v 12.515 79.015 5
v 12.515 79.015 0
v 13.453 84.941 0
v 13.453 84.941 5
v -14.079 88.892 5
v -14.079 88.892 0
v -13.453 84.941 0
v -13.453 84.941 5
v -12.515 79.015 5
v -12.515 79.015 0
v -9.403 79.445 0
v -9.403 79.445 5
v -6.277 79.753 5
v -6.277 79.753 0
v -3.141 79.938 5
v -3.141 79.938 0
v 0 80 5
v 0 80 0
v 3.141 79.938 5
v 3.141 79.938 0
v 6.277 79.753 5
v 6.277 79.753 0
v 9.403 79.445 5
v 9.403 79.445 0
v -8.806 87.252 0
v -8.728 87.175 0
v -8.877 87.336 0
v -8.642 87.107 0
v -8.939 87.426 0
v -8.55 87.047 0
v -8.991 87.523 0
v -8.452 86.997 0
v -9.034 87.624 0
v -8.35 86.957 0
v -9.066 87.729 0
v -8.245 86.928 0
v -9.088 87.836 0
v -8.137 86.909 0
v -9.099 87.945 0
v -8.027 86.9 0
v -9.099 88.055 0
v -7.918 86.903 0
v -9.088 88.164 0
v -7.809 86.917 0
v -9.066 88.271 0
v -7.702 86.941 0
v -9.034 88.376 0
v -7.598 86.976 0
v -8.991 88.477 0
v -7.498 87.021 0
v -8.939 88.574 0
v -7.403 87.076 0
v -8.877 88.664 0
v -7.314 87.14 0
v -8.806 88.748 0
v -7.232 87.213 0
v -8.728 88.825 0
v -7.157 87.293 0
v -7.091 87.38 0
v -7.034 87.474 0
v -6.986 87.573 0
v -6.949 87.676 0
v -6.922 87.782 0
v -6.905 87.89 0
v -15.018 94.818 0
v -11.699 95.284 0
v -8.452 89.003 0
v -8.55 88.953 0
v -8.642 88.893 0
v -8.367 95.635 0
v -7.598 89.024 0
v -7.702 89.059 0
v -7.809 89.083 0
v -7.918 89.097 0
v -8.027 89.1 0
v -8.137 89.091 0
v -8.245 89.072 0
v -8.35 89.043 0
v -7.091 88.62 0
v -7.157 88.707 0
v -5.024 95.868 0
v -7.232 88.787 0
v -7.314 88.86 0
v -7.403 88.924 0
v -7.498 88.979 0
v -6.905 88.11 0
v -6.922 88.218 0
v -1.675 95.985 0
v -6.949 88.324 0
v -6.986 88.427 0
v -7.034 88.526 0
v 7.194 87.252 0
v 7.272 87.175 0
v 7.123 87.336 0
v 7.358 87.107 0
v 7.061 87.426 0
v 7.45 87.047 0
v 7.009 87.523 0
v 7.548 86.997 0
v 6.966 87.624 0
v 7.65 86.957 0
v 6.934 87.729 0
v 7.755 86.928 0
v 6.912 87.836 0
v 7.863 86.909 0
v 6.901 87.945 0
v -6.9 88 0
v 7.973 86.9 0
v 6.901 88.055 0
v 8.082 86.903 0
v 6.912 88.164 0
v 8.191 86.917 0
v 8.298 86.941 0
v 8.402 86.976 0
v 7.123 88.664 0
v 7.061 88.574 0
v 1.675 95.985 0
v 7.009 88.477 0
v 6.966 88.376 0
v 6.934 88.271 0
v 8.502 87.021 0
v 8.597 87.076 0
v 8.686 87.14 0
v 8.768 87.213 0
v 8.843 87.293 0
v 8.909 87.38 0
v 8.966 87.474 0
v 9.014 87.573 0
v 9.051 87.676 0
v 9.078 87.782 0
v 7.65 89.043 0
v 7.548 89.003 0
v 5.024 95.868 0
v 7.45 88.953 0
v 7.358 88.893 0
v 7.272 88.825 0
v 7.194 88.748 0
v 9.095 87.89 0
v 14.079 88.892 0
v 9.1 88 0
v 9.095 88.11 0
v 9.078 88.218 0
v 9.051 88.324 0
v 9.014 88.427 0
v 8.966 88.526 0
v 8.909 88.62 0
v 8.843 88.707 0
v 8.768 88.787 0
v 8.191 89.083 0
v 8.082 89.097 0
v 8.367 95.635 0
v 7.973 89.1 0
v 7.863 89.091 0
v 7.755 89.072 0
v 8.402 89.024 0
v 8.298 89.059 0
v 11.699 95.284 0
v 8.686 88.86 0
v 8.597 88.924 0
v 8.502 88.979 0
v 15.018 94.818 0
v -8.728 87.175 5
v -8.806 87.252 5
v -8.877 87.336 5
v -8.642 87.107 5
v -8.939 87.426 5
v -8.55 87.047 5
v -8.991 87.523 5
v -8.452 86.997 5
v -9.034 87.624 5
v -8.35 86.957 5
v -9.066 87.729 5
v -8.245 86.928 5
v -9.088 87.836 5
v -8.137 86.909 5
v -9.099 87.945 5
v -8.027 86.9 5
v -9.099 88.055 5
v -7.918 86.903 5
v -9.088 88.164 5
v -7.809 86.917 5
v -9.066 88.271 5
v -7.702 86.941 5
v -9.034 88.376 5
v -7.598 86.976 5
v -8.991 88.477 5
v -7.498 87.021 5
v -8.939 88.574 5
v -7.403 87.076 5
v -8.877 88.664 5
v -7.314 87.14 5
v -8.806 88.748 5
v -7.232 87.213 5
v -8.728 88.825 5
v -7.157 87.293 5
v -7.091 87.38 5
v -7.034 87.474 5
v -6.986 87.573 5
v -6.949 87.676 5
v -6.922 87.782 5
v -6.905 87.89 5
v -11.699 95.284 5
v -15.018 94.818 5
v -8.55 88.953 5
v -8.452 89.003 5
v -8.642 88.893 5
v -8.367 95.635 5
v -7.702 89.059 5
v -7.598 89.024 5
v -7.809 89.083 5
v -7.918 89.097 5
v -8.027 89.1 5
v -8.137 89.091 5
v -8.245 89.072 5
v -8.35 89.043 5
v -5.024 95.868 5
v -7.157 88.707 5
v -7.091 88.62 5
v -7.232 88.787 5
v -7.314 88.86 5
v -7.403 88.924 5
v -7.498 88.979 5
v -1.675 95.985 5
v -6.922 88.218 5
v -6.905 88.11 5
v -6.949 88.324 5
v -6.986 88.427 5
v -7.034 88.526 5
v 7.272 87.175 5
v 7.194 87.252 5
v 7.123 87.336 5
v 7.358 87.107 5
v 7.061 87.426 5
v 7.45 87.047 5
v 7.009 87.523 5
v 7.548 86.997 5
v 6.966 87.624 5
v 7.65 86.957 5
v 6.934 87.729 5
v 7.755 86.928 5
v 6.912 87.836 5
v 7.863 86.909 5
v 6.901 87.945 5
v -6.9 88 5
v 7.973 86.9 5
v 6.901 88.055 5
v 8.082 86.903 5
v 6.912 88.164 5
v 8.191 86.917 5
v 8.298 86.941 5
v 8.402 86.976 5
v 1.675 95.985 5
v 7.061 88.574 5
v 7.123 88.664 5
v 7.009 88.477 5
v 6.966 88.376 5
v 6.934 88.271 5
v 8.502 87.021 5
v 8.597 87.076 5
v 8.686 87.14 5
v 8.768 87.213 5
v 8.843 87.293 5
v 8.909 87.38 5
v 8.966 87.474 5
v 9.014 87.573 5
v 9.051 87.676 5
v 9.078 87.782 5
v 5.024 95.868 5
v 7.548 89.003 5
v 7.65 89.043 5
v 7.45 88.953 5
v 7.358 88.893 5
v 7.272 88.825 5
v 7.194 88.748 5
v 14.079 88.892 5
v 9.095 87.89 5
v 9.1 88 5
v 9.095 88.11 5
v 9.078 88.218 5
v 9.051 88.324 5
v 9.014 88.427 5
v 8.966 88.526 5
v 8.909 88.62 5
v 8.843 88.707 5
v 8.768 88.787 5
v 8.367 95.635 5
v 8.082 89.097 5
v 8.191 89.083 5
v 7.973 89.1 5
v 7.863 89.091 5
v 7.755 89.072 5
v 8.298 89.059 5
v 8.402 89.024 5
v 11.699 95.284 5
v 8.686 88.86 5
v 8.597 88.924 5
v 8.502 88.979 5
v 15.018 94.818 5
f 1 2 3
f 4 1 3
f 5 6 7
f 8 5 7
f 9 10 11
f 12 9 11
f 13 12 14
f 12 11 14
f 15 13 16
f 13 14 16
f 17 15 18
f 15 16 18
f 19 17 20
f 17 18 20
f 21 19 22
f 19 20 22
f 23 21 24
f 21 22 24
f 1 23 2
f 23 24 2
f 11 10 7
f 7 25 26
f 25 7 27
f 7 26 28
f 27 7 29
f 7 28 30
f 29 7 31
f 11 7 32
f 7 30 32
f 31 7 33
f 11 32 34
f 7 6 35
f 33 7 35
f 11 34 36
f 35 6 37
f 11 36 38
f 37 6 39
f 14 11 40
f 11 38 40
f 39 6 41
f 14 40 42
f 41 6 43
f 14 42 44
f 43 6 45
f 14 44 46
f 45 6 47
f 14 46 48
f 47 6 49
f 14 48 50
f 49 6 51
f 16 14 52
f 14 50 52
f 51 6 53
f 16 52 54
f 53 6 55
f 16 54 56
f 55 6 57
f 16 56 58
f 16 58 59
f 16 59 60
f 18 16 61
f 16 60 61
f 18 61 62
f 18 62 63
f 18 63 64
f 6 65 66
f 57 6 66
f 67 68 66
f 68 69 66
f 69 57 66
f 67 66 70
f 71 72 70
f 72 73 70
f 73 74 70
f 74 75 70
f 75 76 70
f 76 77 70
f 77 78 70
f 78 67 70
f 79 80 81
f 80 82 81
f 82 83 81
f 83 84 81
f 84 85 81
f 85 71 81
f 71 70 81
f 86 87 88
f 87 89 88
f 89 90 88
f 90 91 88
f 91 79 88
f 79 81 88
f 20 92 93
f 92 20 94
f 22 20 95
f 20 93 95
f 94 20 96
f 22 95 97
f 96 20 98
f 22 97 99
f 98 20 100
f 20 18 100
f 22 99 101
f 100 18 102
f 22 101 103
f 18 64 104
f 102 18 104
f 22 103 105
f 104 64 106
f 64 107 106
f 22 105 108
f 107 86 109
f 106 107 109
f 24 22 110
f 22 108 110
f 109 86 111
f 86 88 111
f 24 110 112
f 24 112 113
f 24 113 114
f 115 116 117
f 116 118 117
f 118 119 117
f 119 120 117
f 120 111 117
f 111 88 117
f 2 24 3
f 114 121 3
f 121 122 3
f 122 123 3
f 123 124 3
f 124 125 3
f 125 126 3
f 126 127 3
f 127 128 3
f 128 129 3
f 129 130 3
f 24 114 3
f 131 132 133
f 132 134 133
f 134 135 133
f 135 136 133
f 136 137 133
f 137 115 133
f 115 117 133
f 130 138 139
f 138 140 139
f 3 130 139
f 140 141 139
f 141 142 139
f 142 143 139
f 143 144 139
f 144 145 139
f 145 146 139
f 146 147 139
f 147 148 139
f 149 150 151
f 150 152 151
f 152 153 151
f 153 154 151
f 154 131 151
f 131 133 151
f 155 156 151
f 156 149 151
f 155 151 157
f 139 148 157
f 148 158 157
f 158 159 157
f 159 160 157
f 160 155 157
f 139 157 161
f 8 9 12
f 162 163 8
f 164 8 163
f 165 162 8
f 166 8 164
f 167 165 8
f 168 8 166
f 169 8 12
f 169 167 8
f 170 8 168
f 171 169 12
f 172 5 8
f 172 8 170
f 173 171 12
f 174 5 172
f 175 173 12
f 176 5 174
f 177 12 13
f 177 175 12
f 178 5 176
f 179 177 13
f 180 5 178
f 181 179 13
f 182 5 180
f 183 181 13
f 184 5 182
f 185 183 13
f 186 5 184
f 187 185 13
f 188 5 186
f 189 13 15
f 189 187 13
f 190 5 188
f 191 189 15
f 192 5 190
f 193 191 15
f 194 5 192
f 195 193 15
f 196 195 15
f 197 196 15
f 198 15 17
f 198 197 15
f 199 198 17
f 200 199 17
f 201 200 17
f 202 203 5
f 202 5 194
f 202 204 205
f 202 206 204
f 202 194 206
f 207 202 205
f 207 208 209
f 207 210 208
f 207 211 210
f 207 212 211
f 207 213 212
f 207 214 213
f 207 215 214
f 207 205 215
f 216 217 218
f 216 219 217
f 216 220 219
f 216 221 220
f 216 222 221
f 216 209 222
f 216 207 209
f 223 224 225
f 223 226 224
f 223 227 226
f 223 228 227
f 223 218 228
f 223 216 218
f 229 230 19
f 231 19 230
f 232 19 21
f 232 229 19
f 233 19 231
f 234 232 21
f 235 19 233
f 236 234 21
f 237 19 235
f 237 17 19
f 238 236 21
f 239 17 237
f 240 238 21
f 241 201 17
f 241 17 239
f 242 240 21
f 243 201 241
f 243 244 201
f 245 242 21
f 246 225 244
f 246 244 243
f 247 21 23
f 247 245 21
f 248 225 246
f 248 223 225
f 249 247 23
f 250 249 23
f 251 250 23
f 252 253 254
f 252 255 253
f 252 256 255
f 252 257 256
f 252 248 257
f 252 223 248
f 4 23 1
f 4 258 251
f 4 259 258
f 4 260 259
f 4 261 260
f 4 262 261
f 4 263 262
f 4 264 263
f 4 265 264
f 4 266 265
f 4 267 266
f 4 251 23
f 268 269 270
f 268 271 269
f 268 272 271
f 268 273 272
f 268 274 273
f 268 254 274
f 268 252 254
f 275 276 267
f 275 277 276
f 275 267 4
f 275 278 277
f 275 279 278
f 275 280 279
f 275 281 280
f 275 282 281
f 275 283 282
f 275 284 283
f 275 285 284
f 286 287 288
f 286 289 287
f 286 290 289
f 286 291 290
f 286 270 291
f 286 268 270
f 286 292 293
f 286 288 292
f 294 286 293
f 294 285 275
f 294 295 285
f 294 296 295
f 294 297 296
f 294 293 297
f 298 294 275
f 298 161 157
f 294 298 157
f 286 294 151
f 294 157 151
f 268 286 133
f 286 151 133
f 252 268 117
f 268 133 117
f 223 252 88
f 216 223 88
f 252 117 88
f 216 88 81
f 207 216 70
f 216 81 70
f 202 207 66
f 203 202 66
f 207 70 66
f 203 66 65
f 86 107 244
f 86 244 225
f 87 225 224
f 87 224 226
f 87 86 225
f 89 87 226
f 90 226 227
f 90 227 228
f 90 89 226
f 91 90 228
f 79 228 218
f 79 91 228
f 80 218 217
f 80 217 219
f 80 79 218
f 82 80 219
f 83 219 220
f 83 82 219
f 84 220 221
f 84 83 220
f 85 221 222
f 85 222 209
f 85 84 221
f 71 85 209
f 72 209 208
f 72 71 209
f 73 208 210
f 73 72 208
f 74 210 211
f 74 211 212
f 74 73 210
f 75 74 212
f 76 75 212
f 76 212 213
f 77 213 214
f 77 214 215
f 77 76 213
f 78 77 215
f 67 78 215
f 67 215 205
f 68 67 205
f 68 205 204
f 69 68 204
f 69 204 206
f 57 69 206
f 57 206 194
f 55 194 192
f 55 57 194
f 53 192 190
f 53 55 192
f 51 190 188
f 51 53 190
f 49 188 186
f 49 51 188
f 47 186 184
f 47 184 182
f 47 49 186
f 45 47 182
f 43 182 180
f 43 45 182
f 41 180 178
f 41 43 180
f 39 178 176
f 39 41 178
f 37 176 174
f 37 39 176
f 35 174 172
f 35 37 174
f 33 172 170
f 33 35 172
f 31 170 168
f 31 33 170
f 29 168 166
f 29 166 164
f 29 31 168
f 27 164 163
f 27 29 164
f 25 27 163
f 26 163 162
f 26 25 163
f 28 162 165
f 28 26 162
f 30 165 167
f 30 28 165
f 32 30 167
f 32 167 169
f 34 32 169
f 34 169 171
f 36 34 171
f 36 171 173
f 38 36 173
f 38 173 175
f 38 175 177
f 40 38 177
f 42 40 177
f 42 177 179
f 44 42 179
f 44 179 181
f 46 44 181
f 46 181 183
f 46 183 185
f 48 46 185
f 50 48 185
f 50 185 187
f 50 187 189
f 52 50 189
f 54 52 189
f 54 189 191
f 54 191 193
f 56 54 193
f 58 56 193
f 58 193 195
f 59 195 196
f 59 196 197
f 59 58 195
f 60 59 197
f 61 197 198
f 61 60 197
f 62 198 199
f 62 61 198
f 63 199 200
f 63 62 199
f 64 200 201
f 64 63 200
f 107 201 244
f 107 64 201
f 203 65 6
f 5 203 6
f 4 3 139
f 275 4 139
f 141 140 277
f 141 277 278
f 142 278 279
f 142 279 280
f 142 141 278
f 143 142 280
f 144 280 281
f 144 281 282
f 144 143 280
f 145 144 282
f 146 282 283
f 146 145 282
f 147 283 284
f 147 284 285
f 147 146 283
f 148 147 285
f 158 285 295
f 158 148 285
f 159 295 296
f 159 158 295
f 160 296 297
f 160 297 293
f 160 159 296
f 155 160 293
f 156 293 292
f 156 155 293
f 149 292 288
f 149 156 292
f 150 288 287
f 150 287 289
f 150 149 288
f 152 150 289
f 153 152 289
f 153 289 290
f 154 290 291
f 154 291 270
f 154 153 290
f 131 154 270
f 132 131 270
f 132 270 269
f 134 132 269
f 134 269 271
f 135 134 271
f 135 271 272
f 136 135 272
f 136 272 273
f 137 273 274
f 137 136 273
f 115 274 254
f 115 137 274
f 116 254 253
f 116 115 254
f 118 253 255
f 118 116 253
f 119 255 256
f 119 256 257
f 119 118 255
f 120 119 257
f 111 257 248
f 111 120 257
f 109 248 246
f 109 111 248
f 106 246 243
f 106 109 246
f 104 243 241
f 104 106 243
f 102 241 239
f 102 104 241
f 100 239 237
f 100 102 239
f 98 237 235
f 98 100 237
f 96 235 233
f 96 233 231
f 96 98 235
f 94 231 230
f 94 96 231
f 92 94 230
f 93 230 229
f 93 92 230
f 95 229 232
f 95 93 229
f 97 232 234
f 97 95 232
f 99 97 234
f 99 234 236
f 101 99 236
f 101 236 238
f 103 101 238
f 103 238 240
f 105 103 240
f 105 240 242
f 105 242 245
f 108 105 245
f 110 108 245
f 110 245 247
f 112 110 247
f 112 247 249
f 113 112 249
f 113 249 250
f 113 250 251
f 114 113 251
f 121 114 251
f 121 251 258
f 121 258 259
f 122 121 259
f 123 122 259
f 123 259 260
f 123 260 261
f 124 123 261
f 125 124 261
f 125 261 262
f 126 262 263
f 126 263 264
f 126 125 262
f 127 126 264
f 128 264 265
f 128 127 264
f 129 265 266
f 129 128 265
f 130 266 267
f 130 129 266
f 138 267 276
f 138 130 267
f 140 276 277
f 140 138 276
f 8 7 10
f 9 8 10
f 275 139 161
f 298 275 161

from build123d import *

# Parameters (mm, degrees)
SKETCH1_R           = 1.1
BOSS_EXTRUDE1_DEPTH = 5


with BuildPart() as part:
    # Sketch1 → Boss-Extrude1 (new body)
    with BuildSketch(Plane.XY):
        with BuildLine():
            Line((-13.453363993, 84.941197291), (-12.514757203, 79.015067248))
            ThreePointArc((-12.514757203, 79.015067248), (0, 80), (12.514757203, 79.015067248))
            Line((12.514757203, 79.015067248), (13.453363993, 84.941197291))
            Line((13.453363993, 84.941197291), (14.079101854, 88.891950654))
            Line((14.079101854, 88.891950654), (15.017708644, 94.818080697))
            ThreePointArc((15.017708644, 94.818080697), (0, 96), (-15.017708644, 94.818080697))
            Line((-15.017708644, 94.818080697), (-14.079101854, 88.891950654))
            Line((-14.079101854, 88.891950654), (-13.453363993, 84.941197291))
        make_face()
        with Locations((-8, 88)):
            Circle(SKETCH1_R, mode=Mode.SUBTRACT)
        with Locations((8, 88)):
            Circle(SKETCH1_R, mode=Mode.SUBTRACT)
    extrude(amount=BOSS_EXTRUDE1_DEPTH)


solid = part.part
